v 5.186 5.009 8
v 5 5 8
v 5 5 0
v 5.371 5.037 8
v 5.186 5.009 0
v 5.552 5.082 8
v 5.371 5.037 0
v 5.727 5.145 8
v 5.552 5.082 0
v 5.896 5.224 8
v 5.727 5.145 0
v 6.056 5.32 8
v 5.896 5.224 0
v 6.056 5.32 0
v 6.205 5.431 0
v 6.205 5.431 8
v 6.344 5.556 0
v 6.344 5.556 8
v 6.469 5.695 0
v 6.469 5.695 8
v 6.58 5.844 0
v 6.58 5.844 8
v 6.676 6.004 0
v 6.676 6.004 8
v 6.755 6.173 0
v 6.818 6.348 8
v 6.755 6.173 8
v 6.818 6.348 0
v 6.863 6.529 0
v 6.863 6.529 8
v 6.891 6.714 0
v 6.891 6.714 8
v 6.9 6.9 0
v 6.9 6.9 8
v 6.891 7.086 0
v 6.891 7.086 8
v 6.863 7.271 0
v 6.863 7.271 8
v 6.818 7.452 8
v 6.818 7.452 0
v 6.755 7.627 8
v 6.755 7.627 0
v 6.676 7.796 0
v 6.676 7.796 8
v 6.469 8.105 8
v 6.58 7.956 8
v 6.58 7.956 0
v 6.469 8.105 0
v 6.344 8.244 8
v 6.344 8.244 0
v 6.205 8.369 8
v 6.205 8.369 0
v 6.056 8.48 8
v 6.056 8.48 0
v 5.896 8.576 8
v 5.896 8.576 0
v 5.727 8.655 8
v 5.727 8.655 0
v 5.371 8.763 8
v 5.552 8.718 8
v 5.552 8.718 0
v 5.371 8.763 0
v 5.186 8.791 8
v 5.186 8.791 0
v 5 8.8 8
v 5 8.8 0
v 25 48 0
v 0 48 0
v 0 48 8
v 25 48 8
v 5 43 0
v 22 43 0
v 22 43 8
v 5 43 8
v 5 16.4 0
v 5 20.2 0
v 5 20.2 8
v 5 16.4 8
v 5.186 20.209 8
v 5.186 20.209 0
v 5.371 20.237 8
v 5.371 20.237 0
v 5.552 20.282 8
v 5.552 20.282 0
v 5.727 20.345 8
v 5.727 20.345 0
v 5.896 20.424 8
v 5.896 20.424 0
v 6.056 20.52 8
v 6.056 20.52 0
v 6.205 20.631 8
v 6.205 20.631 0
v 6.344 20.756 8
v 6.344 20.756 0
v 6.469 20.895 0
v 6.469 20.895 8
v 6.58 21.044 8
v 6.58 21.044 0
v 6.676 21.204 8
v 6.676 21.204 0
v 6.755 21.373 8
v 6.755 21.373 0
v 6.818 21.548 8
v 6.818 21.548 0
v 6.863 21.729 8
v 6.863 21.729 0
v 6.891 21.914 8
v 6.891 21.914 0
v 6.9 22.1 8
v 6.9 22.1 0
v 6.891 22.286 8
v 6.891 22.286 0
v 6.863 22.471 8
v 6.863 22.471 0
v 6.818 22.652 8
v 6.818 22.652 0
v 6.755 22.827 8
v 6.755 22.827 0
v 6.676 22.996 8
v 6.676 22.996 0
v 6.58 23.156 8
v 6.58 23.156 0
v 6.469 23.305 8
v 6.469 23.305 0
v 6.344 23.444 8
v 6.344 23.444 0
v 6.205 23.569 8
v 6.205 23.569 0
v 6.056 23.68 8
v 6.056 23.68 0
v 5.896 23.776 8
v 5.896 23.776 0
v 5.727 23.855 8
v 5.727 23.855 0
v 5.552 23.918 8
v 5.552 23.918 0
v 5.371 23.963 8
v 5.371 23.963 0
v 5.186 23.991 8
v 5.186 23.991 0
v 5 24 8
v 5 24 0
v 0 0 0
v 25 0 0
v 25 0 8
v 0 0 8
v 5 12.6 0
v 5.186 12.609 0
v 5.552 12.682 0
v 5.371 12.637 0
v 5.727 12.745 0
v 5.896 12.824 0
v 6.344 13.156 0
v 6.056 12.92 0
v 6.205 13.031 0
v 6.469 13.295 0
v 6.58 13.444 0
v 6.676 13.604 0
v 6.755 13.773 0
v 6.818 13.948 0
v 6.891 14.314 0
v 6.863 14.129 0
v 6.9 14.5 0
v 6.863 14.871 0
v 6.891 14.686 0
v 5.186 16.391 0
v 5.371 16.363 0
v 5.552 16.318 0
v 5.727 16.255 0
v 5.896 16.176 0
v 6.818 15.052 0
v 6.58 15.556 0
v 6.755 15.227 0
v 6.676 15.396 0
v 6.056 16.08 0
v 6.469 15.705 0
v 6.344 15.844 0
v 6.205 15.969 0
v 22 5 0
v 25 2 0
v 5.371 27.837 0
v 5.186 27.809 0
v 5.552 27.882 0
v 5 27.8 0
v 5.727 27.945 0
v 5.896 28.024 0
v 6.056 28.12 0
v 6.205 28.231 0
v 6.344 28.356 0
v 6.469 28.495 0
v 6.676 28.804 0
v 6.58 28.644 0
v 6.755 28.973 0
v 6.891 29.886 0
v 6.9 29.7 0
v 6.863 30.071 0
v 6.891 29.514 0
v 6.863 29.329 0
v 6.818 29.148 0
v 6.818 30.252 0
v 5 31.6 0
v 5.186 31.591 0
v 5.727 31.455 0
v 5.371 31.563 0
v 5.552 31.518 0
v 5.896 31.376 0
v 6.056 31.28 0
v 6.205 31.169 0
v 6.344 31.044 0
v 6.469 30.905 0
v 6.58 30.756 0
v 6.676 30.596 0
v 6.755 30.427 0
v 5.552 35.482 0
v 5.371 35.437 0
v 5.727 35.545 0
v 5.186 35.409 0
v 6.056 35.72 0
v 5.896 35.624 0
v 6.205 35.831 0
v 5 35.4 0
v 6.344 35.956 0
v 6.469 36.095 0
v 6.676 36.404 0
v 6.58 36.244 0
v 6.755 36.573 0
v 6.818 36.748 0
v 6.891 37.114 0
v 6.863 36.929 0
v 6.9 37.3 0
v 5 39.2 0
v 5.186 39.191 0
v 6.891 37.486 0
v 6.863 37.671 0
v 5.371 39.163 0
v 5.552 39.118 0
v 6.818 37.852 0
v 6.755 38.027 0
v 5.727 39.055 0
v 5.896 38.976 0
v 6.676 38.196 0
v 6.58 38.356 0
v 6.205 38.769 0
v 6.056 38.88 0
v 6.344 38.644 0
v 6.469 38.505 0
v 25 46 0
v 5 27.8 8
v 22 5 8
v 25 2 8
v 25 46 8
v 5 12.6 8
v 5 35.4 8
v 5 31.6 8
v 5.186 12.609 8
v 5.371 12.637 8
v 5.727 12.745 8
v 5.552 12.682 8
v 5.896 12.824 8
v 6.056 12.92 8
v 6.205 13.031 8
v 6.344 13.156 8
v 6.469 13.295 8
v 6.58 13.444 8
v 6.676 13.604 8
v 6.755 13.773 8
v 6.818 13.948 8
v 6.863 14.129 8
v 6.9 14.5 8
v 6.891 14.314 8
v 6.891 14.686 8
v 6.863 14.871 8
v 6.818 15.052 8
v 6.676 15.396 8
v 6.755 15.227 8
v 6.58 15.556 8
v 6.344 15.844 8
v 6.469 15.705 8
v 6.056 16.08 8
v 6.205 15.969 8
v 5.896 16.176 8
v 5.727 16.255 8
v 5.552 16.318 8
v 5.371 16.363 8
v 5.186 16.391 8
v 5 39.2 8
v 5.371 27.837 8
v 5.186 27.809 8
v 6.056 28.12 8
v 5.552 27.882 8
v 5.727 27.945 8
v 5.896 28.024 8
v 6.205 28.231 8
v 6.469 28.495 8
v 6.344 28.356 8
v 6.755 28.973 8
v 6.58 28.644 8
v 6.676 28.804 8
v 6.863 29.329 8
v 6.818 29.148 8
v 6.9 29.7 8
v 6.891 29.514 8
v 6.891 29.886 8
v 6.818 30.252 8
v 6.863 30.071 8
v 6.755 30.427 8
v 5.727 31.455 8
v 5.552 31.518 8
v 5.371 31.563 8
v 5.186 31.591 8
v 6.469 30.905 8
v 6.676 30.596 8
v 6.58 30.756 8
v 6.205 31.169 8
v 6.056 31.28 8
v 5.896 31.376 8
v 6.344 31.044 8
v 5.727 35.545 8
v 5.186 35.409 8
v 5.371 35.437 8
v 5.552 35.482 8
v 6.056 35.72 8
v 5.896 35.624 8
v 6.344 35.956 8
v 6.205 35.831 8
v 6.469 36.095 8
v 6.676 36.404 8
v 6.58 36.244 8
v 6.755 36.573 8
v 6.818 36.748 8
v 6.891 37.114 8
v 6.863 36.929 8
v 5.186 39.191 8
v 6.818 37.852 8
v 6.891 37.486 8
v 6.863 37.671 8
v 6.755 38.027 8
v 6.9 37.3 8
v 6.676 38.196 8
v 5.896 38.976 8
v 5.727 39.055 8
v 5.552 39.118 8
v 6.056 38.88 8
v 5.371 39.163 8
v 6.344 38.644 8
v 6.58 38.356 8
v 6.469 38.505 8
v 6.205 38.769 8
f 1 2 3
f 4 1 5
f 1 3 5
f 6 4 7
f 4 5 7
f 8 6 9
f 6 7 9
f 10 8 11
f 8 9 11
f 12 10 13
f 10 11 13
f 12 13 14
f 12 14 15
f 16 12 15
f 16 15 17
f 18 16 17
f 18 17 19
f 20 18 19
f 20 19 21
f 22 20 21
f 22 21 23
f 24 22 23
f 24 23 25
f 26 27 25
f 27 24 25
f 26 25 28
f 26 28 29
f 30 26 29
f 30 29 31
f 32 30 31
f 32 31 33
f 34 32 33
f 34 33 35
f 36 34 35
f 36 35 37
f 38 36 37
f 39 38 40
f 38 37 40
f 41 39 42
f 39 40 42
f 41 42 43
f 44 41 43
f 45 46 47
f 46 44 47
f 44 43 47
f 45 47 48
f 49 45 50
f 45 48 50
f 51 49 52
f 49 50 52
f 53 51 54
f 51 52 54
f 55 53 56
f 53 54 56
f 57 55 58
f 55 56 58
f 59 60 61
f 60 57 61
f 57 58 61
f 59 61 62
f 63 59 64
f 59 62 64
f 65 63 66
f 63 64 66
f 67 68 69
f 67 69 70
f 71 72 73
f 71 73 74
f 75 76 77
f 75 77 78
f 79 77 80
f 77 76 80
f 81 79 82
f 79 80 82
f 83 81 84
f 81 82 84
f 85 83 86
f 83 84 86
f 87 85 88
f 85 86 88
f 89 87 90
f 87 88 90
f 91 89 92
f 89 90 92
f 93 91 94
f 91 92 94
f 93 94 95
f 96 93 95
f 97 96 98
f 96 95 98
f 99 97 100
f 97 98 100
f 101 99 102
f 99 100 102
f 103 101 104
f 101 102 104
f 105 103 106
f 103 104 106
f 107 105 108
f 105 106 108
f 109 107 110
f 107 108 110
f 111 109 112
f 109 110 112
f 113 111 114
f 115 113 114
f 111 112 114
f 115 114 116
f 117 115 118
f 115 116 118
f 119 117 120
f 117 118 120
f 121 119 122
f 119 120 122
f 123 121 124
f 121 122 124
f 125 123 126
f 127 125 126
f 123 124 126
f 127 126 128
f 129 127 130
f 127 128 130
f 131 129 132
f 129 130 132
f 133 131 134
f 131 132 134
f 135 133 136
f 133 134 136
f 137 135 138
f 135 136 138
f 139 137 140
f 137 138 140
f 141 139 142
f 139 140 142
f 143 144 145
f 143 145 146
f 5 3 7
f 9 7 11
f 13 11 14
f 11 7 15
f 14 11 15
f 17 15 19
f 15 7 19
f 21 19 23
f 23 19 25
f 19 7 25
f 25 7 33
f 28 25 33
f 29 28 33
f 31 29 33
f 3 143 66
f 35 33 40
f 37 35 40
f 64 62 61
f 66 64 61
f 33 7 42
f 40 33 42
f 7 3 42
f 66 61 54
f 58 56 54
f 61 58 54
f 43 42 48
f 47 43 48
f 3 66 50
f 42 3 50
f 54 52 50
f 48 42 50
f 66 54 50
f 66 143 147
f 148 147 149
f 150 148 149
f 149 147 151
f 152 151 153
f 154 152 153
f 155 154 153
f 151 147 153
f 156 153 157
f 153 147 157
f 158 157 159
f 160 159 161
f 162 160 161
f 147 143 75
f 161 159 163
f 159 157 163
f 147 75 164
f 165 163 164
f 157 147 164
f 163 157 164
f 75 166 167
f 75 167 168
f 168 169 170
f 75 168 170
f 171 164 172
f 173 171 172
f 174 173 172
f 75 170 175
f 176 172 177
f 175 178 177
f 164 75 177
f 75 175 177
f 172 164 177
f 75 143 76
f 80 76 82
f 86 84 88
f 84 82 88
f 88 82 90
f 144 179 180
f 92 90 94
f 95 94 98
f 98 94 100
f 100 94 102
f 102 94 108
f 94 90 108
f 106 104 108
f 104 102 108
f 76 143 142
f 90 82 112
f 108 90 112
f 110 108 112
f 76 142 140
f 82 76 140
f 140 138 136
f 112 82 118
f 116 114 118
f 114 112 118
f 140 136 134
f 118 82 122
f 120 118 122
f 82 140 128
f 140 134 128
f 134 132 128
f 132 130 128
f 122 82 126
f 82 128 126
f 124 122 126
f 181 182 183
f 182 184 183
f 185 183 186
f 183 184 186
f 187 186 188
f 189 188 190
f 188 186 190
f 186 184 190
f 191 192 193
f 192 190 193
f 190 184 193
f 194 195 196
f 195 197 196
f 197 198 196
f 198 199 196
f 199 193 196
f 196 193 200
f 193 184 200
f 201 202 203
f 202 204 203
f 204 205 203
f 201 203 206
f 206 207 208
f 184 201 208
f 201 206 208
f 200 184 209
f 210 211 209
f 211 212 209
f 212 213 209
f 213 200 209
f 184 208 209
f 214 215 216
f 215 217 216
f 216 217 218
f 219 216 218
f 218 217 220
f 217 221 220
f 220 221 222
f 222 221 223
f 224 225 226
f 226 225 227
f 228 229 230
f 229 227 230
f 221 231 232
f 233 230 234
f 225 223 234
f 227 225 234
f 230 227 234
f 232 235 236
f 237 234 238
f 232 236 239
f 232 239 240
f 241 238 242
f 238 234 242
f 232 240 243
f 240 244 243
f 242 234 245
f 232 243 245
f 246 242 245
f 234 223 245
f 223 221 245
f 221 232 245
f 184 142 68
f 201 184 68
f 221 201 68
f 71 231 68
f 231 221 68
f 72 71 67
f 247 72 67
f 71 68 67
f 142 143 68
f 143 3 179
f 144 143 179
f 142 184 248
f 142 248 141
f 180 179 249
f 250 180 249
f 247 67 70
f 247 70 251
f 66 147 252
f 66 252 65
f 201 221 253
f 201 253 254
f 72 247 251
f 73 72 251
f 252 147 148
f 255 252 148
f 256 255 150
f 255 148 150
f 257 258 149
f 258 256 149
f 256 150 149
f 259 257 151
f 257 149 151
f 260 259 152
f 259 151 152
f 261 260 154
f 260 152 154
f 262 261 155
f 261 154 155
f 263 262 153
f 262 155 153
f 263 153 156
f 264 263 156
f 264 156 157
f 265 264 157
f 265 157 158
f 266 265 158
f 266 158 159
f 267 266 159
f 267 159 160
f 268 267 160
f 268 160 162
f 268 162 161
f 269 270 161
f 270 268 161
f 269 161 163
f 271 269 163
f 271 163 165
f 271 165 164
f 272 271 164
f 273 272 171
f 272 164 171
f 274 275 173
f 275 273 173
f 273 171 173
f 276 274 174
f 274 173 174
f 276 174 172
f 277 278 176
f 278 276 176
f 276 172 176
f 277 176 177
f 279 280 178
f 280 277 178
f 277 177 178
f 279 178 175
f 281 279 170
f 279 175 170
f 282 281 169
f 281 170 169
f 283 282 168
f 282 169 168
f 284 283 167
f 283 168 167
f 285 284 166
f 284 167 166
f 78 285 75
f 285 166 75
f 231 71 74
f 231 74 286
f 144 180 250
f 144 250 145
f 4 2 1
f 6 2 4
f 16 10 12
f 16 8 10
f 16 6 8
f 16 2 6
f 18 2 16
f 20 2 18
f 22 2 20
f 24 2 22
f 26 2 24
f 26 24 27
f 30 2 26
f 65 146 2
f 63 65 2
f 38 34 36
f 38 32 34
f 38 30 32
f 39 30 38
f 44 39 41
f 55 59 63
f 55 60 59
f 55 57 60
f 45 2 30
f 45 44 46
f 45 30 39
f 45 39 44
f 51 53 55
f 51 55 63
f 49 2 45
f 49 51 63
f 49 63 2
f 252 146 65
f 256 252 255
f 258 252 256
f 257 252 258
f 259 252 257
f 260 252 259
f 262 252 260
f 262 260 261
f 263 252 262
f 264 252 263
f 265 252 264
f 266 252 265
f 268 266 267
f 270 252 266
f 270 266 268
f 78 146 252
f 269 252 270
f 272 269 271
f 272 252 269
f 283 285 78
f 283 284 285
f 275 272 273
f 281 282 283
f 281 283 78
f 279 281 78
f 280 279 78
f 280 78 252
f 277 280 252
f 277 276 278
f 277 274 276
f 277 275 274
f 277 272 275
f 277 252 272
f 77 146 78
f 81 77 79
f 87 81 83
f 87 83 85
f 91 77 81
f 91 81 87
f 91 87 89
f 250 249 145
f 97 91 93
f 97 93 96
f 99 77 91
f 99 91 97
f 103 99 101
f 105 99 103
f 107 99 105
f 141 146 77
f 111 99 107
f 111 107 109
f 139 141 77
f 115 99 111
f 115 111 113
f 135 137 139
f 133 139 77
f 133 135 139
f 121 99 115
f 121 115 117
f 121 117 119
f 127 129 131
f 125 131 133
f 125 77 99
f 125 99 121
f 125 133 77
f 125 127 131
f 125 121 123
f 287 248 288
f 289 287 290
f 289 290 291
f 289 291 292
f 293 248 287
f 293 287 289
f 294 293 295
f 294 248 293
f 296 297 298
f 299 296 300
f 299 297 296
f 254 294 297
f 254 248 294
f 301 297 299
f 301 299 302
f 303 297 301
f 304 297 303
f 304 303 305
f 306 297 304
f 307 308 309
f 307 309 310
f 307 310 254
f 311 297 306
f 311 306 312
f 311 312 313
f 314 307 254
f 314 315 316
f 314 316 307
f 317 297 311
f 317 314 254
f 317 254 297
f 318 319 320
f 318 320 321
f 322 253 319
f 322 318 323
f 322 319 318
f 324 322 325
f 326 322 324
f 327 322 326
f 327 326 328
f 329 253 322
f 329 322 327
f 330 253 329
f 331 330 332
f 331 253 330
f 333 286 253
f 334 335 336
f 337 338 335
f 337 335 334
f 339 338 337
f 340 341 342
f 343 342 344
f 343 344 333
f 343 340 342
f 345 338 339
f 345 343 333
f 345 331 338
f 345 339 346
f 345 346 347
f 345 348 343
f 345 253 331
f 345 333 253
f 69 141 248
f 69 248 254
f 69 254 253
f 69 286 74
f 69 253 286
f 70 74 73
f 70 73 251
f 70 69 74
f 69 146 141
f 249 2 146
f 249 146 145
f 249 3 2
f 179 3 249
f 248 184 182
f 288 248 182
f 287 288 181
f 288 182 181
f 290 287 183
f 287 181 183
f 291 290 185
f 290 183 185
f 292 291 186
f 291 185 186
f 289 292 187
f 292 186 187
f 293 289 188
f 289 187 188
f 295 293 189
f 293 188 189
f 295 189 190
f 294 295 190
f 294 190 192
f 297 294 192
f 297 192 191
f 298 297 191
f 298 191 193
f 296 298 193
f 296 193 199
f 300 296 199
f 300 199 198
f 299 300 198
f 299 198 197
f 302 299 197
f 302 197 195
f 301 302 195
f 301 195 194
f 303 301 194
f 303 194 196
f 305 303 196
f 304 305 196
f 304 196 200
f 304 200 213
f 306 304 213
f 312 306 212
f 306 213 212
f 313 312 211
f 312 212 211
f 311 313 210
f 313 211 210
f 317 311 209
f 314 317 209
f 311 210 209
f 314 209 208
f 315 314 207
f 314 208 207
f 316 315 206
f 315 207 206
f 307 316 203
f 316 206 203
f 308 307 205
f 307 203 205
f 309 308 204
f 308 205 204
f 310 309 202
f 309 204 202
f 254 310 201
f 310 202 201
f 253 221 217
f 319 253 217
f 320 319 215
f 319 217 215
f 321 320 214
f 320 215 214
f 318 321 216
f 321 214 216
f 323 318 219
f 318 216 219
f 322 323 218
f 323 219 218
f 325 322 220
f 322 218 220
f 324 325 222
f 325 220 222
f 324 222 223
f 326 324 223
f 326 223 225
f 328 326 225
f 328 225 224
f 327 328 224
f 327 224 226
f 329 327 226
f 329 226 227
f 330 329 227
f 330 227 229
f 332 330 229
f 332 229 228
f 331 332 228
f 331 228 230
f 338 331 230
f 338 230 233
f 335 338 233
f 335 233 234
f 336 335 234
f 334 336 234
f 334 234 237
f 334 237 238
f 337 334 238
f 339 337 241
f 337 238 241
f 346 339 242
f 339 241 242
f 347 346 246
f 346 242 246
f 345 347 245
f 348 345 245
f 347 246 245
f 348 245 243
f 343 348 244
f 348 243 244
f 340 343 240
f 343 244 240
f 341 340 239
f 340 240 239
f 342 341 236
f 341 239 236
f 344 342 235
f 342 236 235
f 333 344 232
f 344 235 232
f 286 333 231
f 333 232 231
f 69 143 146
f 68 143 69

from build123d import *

# Parameters (mm, degrees)
BOSS_EXTRUDE1_DEPTH = 8
SKETCH1_3_R         = 1.9
BOSS_EXTRUDE2_DEPTH = 8
LPATTERN1_COUNT     = 5
LPATTERN1_PITCH     = 7.6
CHAMFER1_SIZE       = 3


with BuildPart() as part:
    # Sketch1 → Boss-Extrude1 (new body)
    with BuildSketch(Plane.XY):
        Polygon((0, 0), (0, 48), (25, 48), (25, 43), (5, 43), (5, 5), (25, 5), (25, 0), align=None)
    extrude(amount=BOSS_EXTRUDE1_DEPTH)

    # Sketch1<3> → Boss-Extrude2 (add)
    with BuildSketch(Plane.XY):
        with Locations((5, 6.9)):
            Circle(SKETCH1_3_R)
    boss_extrude2 = extrude(amount=BOSS_EXTRUDE2_DEPTH)

    # LPattern1: Boss-Extrude2 ×5
    with Locations(*[(0, i * LPATTERN1_PITCH, 0) for i in range(1, LPATTERN1_COUNT)]):
        add(boss_extrude2)

    # Chamfer1
    chamfer1_edges = [part.edges().sort_by_distance(p)[0] for p in [
        (25, 43, 4),
        (25, 5, 4),
    ]]
    chamfer(chamfer1_edges, length=CHAMFER1_SIZE)


solid = part.part
